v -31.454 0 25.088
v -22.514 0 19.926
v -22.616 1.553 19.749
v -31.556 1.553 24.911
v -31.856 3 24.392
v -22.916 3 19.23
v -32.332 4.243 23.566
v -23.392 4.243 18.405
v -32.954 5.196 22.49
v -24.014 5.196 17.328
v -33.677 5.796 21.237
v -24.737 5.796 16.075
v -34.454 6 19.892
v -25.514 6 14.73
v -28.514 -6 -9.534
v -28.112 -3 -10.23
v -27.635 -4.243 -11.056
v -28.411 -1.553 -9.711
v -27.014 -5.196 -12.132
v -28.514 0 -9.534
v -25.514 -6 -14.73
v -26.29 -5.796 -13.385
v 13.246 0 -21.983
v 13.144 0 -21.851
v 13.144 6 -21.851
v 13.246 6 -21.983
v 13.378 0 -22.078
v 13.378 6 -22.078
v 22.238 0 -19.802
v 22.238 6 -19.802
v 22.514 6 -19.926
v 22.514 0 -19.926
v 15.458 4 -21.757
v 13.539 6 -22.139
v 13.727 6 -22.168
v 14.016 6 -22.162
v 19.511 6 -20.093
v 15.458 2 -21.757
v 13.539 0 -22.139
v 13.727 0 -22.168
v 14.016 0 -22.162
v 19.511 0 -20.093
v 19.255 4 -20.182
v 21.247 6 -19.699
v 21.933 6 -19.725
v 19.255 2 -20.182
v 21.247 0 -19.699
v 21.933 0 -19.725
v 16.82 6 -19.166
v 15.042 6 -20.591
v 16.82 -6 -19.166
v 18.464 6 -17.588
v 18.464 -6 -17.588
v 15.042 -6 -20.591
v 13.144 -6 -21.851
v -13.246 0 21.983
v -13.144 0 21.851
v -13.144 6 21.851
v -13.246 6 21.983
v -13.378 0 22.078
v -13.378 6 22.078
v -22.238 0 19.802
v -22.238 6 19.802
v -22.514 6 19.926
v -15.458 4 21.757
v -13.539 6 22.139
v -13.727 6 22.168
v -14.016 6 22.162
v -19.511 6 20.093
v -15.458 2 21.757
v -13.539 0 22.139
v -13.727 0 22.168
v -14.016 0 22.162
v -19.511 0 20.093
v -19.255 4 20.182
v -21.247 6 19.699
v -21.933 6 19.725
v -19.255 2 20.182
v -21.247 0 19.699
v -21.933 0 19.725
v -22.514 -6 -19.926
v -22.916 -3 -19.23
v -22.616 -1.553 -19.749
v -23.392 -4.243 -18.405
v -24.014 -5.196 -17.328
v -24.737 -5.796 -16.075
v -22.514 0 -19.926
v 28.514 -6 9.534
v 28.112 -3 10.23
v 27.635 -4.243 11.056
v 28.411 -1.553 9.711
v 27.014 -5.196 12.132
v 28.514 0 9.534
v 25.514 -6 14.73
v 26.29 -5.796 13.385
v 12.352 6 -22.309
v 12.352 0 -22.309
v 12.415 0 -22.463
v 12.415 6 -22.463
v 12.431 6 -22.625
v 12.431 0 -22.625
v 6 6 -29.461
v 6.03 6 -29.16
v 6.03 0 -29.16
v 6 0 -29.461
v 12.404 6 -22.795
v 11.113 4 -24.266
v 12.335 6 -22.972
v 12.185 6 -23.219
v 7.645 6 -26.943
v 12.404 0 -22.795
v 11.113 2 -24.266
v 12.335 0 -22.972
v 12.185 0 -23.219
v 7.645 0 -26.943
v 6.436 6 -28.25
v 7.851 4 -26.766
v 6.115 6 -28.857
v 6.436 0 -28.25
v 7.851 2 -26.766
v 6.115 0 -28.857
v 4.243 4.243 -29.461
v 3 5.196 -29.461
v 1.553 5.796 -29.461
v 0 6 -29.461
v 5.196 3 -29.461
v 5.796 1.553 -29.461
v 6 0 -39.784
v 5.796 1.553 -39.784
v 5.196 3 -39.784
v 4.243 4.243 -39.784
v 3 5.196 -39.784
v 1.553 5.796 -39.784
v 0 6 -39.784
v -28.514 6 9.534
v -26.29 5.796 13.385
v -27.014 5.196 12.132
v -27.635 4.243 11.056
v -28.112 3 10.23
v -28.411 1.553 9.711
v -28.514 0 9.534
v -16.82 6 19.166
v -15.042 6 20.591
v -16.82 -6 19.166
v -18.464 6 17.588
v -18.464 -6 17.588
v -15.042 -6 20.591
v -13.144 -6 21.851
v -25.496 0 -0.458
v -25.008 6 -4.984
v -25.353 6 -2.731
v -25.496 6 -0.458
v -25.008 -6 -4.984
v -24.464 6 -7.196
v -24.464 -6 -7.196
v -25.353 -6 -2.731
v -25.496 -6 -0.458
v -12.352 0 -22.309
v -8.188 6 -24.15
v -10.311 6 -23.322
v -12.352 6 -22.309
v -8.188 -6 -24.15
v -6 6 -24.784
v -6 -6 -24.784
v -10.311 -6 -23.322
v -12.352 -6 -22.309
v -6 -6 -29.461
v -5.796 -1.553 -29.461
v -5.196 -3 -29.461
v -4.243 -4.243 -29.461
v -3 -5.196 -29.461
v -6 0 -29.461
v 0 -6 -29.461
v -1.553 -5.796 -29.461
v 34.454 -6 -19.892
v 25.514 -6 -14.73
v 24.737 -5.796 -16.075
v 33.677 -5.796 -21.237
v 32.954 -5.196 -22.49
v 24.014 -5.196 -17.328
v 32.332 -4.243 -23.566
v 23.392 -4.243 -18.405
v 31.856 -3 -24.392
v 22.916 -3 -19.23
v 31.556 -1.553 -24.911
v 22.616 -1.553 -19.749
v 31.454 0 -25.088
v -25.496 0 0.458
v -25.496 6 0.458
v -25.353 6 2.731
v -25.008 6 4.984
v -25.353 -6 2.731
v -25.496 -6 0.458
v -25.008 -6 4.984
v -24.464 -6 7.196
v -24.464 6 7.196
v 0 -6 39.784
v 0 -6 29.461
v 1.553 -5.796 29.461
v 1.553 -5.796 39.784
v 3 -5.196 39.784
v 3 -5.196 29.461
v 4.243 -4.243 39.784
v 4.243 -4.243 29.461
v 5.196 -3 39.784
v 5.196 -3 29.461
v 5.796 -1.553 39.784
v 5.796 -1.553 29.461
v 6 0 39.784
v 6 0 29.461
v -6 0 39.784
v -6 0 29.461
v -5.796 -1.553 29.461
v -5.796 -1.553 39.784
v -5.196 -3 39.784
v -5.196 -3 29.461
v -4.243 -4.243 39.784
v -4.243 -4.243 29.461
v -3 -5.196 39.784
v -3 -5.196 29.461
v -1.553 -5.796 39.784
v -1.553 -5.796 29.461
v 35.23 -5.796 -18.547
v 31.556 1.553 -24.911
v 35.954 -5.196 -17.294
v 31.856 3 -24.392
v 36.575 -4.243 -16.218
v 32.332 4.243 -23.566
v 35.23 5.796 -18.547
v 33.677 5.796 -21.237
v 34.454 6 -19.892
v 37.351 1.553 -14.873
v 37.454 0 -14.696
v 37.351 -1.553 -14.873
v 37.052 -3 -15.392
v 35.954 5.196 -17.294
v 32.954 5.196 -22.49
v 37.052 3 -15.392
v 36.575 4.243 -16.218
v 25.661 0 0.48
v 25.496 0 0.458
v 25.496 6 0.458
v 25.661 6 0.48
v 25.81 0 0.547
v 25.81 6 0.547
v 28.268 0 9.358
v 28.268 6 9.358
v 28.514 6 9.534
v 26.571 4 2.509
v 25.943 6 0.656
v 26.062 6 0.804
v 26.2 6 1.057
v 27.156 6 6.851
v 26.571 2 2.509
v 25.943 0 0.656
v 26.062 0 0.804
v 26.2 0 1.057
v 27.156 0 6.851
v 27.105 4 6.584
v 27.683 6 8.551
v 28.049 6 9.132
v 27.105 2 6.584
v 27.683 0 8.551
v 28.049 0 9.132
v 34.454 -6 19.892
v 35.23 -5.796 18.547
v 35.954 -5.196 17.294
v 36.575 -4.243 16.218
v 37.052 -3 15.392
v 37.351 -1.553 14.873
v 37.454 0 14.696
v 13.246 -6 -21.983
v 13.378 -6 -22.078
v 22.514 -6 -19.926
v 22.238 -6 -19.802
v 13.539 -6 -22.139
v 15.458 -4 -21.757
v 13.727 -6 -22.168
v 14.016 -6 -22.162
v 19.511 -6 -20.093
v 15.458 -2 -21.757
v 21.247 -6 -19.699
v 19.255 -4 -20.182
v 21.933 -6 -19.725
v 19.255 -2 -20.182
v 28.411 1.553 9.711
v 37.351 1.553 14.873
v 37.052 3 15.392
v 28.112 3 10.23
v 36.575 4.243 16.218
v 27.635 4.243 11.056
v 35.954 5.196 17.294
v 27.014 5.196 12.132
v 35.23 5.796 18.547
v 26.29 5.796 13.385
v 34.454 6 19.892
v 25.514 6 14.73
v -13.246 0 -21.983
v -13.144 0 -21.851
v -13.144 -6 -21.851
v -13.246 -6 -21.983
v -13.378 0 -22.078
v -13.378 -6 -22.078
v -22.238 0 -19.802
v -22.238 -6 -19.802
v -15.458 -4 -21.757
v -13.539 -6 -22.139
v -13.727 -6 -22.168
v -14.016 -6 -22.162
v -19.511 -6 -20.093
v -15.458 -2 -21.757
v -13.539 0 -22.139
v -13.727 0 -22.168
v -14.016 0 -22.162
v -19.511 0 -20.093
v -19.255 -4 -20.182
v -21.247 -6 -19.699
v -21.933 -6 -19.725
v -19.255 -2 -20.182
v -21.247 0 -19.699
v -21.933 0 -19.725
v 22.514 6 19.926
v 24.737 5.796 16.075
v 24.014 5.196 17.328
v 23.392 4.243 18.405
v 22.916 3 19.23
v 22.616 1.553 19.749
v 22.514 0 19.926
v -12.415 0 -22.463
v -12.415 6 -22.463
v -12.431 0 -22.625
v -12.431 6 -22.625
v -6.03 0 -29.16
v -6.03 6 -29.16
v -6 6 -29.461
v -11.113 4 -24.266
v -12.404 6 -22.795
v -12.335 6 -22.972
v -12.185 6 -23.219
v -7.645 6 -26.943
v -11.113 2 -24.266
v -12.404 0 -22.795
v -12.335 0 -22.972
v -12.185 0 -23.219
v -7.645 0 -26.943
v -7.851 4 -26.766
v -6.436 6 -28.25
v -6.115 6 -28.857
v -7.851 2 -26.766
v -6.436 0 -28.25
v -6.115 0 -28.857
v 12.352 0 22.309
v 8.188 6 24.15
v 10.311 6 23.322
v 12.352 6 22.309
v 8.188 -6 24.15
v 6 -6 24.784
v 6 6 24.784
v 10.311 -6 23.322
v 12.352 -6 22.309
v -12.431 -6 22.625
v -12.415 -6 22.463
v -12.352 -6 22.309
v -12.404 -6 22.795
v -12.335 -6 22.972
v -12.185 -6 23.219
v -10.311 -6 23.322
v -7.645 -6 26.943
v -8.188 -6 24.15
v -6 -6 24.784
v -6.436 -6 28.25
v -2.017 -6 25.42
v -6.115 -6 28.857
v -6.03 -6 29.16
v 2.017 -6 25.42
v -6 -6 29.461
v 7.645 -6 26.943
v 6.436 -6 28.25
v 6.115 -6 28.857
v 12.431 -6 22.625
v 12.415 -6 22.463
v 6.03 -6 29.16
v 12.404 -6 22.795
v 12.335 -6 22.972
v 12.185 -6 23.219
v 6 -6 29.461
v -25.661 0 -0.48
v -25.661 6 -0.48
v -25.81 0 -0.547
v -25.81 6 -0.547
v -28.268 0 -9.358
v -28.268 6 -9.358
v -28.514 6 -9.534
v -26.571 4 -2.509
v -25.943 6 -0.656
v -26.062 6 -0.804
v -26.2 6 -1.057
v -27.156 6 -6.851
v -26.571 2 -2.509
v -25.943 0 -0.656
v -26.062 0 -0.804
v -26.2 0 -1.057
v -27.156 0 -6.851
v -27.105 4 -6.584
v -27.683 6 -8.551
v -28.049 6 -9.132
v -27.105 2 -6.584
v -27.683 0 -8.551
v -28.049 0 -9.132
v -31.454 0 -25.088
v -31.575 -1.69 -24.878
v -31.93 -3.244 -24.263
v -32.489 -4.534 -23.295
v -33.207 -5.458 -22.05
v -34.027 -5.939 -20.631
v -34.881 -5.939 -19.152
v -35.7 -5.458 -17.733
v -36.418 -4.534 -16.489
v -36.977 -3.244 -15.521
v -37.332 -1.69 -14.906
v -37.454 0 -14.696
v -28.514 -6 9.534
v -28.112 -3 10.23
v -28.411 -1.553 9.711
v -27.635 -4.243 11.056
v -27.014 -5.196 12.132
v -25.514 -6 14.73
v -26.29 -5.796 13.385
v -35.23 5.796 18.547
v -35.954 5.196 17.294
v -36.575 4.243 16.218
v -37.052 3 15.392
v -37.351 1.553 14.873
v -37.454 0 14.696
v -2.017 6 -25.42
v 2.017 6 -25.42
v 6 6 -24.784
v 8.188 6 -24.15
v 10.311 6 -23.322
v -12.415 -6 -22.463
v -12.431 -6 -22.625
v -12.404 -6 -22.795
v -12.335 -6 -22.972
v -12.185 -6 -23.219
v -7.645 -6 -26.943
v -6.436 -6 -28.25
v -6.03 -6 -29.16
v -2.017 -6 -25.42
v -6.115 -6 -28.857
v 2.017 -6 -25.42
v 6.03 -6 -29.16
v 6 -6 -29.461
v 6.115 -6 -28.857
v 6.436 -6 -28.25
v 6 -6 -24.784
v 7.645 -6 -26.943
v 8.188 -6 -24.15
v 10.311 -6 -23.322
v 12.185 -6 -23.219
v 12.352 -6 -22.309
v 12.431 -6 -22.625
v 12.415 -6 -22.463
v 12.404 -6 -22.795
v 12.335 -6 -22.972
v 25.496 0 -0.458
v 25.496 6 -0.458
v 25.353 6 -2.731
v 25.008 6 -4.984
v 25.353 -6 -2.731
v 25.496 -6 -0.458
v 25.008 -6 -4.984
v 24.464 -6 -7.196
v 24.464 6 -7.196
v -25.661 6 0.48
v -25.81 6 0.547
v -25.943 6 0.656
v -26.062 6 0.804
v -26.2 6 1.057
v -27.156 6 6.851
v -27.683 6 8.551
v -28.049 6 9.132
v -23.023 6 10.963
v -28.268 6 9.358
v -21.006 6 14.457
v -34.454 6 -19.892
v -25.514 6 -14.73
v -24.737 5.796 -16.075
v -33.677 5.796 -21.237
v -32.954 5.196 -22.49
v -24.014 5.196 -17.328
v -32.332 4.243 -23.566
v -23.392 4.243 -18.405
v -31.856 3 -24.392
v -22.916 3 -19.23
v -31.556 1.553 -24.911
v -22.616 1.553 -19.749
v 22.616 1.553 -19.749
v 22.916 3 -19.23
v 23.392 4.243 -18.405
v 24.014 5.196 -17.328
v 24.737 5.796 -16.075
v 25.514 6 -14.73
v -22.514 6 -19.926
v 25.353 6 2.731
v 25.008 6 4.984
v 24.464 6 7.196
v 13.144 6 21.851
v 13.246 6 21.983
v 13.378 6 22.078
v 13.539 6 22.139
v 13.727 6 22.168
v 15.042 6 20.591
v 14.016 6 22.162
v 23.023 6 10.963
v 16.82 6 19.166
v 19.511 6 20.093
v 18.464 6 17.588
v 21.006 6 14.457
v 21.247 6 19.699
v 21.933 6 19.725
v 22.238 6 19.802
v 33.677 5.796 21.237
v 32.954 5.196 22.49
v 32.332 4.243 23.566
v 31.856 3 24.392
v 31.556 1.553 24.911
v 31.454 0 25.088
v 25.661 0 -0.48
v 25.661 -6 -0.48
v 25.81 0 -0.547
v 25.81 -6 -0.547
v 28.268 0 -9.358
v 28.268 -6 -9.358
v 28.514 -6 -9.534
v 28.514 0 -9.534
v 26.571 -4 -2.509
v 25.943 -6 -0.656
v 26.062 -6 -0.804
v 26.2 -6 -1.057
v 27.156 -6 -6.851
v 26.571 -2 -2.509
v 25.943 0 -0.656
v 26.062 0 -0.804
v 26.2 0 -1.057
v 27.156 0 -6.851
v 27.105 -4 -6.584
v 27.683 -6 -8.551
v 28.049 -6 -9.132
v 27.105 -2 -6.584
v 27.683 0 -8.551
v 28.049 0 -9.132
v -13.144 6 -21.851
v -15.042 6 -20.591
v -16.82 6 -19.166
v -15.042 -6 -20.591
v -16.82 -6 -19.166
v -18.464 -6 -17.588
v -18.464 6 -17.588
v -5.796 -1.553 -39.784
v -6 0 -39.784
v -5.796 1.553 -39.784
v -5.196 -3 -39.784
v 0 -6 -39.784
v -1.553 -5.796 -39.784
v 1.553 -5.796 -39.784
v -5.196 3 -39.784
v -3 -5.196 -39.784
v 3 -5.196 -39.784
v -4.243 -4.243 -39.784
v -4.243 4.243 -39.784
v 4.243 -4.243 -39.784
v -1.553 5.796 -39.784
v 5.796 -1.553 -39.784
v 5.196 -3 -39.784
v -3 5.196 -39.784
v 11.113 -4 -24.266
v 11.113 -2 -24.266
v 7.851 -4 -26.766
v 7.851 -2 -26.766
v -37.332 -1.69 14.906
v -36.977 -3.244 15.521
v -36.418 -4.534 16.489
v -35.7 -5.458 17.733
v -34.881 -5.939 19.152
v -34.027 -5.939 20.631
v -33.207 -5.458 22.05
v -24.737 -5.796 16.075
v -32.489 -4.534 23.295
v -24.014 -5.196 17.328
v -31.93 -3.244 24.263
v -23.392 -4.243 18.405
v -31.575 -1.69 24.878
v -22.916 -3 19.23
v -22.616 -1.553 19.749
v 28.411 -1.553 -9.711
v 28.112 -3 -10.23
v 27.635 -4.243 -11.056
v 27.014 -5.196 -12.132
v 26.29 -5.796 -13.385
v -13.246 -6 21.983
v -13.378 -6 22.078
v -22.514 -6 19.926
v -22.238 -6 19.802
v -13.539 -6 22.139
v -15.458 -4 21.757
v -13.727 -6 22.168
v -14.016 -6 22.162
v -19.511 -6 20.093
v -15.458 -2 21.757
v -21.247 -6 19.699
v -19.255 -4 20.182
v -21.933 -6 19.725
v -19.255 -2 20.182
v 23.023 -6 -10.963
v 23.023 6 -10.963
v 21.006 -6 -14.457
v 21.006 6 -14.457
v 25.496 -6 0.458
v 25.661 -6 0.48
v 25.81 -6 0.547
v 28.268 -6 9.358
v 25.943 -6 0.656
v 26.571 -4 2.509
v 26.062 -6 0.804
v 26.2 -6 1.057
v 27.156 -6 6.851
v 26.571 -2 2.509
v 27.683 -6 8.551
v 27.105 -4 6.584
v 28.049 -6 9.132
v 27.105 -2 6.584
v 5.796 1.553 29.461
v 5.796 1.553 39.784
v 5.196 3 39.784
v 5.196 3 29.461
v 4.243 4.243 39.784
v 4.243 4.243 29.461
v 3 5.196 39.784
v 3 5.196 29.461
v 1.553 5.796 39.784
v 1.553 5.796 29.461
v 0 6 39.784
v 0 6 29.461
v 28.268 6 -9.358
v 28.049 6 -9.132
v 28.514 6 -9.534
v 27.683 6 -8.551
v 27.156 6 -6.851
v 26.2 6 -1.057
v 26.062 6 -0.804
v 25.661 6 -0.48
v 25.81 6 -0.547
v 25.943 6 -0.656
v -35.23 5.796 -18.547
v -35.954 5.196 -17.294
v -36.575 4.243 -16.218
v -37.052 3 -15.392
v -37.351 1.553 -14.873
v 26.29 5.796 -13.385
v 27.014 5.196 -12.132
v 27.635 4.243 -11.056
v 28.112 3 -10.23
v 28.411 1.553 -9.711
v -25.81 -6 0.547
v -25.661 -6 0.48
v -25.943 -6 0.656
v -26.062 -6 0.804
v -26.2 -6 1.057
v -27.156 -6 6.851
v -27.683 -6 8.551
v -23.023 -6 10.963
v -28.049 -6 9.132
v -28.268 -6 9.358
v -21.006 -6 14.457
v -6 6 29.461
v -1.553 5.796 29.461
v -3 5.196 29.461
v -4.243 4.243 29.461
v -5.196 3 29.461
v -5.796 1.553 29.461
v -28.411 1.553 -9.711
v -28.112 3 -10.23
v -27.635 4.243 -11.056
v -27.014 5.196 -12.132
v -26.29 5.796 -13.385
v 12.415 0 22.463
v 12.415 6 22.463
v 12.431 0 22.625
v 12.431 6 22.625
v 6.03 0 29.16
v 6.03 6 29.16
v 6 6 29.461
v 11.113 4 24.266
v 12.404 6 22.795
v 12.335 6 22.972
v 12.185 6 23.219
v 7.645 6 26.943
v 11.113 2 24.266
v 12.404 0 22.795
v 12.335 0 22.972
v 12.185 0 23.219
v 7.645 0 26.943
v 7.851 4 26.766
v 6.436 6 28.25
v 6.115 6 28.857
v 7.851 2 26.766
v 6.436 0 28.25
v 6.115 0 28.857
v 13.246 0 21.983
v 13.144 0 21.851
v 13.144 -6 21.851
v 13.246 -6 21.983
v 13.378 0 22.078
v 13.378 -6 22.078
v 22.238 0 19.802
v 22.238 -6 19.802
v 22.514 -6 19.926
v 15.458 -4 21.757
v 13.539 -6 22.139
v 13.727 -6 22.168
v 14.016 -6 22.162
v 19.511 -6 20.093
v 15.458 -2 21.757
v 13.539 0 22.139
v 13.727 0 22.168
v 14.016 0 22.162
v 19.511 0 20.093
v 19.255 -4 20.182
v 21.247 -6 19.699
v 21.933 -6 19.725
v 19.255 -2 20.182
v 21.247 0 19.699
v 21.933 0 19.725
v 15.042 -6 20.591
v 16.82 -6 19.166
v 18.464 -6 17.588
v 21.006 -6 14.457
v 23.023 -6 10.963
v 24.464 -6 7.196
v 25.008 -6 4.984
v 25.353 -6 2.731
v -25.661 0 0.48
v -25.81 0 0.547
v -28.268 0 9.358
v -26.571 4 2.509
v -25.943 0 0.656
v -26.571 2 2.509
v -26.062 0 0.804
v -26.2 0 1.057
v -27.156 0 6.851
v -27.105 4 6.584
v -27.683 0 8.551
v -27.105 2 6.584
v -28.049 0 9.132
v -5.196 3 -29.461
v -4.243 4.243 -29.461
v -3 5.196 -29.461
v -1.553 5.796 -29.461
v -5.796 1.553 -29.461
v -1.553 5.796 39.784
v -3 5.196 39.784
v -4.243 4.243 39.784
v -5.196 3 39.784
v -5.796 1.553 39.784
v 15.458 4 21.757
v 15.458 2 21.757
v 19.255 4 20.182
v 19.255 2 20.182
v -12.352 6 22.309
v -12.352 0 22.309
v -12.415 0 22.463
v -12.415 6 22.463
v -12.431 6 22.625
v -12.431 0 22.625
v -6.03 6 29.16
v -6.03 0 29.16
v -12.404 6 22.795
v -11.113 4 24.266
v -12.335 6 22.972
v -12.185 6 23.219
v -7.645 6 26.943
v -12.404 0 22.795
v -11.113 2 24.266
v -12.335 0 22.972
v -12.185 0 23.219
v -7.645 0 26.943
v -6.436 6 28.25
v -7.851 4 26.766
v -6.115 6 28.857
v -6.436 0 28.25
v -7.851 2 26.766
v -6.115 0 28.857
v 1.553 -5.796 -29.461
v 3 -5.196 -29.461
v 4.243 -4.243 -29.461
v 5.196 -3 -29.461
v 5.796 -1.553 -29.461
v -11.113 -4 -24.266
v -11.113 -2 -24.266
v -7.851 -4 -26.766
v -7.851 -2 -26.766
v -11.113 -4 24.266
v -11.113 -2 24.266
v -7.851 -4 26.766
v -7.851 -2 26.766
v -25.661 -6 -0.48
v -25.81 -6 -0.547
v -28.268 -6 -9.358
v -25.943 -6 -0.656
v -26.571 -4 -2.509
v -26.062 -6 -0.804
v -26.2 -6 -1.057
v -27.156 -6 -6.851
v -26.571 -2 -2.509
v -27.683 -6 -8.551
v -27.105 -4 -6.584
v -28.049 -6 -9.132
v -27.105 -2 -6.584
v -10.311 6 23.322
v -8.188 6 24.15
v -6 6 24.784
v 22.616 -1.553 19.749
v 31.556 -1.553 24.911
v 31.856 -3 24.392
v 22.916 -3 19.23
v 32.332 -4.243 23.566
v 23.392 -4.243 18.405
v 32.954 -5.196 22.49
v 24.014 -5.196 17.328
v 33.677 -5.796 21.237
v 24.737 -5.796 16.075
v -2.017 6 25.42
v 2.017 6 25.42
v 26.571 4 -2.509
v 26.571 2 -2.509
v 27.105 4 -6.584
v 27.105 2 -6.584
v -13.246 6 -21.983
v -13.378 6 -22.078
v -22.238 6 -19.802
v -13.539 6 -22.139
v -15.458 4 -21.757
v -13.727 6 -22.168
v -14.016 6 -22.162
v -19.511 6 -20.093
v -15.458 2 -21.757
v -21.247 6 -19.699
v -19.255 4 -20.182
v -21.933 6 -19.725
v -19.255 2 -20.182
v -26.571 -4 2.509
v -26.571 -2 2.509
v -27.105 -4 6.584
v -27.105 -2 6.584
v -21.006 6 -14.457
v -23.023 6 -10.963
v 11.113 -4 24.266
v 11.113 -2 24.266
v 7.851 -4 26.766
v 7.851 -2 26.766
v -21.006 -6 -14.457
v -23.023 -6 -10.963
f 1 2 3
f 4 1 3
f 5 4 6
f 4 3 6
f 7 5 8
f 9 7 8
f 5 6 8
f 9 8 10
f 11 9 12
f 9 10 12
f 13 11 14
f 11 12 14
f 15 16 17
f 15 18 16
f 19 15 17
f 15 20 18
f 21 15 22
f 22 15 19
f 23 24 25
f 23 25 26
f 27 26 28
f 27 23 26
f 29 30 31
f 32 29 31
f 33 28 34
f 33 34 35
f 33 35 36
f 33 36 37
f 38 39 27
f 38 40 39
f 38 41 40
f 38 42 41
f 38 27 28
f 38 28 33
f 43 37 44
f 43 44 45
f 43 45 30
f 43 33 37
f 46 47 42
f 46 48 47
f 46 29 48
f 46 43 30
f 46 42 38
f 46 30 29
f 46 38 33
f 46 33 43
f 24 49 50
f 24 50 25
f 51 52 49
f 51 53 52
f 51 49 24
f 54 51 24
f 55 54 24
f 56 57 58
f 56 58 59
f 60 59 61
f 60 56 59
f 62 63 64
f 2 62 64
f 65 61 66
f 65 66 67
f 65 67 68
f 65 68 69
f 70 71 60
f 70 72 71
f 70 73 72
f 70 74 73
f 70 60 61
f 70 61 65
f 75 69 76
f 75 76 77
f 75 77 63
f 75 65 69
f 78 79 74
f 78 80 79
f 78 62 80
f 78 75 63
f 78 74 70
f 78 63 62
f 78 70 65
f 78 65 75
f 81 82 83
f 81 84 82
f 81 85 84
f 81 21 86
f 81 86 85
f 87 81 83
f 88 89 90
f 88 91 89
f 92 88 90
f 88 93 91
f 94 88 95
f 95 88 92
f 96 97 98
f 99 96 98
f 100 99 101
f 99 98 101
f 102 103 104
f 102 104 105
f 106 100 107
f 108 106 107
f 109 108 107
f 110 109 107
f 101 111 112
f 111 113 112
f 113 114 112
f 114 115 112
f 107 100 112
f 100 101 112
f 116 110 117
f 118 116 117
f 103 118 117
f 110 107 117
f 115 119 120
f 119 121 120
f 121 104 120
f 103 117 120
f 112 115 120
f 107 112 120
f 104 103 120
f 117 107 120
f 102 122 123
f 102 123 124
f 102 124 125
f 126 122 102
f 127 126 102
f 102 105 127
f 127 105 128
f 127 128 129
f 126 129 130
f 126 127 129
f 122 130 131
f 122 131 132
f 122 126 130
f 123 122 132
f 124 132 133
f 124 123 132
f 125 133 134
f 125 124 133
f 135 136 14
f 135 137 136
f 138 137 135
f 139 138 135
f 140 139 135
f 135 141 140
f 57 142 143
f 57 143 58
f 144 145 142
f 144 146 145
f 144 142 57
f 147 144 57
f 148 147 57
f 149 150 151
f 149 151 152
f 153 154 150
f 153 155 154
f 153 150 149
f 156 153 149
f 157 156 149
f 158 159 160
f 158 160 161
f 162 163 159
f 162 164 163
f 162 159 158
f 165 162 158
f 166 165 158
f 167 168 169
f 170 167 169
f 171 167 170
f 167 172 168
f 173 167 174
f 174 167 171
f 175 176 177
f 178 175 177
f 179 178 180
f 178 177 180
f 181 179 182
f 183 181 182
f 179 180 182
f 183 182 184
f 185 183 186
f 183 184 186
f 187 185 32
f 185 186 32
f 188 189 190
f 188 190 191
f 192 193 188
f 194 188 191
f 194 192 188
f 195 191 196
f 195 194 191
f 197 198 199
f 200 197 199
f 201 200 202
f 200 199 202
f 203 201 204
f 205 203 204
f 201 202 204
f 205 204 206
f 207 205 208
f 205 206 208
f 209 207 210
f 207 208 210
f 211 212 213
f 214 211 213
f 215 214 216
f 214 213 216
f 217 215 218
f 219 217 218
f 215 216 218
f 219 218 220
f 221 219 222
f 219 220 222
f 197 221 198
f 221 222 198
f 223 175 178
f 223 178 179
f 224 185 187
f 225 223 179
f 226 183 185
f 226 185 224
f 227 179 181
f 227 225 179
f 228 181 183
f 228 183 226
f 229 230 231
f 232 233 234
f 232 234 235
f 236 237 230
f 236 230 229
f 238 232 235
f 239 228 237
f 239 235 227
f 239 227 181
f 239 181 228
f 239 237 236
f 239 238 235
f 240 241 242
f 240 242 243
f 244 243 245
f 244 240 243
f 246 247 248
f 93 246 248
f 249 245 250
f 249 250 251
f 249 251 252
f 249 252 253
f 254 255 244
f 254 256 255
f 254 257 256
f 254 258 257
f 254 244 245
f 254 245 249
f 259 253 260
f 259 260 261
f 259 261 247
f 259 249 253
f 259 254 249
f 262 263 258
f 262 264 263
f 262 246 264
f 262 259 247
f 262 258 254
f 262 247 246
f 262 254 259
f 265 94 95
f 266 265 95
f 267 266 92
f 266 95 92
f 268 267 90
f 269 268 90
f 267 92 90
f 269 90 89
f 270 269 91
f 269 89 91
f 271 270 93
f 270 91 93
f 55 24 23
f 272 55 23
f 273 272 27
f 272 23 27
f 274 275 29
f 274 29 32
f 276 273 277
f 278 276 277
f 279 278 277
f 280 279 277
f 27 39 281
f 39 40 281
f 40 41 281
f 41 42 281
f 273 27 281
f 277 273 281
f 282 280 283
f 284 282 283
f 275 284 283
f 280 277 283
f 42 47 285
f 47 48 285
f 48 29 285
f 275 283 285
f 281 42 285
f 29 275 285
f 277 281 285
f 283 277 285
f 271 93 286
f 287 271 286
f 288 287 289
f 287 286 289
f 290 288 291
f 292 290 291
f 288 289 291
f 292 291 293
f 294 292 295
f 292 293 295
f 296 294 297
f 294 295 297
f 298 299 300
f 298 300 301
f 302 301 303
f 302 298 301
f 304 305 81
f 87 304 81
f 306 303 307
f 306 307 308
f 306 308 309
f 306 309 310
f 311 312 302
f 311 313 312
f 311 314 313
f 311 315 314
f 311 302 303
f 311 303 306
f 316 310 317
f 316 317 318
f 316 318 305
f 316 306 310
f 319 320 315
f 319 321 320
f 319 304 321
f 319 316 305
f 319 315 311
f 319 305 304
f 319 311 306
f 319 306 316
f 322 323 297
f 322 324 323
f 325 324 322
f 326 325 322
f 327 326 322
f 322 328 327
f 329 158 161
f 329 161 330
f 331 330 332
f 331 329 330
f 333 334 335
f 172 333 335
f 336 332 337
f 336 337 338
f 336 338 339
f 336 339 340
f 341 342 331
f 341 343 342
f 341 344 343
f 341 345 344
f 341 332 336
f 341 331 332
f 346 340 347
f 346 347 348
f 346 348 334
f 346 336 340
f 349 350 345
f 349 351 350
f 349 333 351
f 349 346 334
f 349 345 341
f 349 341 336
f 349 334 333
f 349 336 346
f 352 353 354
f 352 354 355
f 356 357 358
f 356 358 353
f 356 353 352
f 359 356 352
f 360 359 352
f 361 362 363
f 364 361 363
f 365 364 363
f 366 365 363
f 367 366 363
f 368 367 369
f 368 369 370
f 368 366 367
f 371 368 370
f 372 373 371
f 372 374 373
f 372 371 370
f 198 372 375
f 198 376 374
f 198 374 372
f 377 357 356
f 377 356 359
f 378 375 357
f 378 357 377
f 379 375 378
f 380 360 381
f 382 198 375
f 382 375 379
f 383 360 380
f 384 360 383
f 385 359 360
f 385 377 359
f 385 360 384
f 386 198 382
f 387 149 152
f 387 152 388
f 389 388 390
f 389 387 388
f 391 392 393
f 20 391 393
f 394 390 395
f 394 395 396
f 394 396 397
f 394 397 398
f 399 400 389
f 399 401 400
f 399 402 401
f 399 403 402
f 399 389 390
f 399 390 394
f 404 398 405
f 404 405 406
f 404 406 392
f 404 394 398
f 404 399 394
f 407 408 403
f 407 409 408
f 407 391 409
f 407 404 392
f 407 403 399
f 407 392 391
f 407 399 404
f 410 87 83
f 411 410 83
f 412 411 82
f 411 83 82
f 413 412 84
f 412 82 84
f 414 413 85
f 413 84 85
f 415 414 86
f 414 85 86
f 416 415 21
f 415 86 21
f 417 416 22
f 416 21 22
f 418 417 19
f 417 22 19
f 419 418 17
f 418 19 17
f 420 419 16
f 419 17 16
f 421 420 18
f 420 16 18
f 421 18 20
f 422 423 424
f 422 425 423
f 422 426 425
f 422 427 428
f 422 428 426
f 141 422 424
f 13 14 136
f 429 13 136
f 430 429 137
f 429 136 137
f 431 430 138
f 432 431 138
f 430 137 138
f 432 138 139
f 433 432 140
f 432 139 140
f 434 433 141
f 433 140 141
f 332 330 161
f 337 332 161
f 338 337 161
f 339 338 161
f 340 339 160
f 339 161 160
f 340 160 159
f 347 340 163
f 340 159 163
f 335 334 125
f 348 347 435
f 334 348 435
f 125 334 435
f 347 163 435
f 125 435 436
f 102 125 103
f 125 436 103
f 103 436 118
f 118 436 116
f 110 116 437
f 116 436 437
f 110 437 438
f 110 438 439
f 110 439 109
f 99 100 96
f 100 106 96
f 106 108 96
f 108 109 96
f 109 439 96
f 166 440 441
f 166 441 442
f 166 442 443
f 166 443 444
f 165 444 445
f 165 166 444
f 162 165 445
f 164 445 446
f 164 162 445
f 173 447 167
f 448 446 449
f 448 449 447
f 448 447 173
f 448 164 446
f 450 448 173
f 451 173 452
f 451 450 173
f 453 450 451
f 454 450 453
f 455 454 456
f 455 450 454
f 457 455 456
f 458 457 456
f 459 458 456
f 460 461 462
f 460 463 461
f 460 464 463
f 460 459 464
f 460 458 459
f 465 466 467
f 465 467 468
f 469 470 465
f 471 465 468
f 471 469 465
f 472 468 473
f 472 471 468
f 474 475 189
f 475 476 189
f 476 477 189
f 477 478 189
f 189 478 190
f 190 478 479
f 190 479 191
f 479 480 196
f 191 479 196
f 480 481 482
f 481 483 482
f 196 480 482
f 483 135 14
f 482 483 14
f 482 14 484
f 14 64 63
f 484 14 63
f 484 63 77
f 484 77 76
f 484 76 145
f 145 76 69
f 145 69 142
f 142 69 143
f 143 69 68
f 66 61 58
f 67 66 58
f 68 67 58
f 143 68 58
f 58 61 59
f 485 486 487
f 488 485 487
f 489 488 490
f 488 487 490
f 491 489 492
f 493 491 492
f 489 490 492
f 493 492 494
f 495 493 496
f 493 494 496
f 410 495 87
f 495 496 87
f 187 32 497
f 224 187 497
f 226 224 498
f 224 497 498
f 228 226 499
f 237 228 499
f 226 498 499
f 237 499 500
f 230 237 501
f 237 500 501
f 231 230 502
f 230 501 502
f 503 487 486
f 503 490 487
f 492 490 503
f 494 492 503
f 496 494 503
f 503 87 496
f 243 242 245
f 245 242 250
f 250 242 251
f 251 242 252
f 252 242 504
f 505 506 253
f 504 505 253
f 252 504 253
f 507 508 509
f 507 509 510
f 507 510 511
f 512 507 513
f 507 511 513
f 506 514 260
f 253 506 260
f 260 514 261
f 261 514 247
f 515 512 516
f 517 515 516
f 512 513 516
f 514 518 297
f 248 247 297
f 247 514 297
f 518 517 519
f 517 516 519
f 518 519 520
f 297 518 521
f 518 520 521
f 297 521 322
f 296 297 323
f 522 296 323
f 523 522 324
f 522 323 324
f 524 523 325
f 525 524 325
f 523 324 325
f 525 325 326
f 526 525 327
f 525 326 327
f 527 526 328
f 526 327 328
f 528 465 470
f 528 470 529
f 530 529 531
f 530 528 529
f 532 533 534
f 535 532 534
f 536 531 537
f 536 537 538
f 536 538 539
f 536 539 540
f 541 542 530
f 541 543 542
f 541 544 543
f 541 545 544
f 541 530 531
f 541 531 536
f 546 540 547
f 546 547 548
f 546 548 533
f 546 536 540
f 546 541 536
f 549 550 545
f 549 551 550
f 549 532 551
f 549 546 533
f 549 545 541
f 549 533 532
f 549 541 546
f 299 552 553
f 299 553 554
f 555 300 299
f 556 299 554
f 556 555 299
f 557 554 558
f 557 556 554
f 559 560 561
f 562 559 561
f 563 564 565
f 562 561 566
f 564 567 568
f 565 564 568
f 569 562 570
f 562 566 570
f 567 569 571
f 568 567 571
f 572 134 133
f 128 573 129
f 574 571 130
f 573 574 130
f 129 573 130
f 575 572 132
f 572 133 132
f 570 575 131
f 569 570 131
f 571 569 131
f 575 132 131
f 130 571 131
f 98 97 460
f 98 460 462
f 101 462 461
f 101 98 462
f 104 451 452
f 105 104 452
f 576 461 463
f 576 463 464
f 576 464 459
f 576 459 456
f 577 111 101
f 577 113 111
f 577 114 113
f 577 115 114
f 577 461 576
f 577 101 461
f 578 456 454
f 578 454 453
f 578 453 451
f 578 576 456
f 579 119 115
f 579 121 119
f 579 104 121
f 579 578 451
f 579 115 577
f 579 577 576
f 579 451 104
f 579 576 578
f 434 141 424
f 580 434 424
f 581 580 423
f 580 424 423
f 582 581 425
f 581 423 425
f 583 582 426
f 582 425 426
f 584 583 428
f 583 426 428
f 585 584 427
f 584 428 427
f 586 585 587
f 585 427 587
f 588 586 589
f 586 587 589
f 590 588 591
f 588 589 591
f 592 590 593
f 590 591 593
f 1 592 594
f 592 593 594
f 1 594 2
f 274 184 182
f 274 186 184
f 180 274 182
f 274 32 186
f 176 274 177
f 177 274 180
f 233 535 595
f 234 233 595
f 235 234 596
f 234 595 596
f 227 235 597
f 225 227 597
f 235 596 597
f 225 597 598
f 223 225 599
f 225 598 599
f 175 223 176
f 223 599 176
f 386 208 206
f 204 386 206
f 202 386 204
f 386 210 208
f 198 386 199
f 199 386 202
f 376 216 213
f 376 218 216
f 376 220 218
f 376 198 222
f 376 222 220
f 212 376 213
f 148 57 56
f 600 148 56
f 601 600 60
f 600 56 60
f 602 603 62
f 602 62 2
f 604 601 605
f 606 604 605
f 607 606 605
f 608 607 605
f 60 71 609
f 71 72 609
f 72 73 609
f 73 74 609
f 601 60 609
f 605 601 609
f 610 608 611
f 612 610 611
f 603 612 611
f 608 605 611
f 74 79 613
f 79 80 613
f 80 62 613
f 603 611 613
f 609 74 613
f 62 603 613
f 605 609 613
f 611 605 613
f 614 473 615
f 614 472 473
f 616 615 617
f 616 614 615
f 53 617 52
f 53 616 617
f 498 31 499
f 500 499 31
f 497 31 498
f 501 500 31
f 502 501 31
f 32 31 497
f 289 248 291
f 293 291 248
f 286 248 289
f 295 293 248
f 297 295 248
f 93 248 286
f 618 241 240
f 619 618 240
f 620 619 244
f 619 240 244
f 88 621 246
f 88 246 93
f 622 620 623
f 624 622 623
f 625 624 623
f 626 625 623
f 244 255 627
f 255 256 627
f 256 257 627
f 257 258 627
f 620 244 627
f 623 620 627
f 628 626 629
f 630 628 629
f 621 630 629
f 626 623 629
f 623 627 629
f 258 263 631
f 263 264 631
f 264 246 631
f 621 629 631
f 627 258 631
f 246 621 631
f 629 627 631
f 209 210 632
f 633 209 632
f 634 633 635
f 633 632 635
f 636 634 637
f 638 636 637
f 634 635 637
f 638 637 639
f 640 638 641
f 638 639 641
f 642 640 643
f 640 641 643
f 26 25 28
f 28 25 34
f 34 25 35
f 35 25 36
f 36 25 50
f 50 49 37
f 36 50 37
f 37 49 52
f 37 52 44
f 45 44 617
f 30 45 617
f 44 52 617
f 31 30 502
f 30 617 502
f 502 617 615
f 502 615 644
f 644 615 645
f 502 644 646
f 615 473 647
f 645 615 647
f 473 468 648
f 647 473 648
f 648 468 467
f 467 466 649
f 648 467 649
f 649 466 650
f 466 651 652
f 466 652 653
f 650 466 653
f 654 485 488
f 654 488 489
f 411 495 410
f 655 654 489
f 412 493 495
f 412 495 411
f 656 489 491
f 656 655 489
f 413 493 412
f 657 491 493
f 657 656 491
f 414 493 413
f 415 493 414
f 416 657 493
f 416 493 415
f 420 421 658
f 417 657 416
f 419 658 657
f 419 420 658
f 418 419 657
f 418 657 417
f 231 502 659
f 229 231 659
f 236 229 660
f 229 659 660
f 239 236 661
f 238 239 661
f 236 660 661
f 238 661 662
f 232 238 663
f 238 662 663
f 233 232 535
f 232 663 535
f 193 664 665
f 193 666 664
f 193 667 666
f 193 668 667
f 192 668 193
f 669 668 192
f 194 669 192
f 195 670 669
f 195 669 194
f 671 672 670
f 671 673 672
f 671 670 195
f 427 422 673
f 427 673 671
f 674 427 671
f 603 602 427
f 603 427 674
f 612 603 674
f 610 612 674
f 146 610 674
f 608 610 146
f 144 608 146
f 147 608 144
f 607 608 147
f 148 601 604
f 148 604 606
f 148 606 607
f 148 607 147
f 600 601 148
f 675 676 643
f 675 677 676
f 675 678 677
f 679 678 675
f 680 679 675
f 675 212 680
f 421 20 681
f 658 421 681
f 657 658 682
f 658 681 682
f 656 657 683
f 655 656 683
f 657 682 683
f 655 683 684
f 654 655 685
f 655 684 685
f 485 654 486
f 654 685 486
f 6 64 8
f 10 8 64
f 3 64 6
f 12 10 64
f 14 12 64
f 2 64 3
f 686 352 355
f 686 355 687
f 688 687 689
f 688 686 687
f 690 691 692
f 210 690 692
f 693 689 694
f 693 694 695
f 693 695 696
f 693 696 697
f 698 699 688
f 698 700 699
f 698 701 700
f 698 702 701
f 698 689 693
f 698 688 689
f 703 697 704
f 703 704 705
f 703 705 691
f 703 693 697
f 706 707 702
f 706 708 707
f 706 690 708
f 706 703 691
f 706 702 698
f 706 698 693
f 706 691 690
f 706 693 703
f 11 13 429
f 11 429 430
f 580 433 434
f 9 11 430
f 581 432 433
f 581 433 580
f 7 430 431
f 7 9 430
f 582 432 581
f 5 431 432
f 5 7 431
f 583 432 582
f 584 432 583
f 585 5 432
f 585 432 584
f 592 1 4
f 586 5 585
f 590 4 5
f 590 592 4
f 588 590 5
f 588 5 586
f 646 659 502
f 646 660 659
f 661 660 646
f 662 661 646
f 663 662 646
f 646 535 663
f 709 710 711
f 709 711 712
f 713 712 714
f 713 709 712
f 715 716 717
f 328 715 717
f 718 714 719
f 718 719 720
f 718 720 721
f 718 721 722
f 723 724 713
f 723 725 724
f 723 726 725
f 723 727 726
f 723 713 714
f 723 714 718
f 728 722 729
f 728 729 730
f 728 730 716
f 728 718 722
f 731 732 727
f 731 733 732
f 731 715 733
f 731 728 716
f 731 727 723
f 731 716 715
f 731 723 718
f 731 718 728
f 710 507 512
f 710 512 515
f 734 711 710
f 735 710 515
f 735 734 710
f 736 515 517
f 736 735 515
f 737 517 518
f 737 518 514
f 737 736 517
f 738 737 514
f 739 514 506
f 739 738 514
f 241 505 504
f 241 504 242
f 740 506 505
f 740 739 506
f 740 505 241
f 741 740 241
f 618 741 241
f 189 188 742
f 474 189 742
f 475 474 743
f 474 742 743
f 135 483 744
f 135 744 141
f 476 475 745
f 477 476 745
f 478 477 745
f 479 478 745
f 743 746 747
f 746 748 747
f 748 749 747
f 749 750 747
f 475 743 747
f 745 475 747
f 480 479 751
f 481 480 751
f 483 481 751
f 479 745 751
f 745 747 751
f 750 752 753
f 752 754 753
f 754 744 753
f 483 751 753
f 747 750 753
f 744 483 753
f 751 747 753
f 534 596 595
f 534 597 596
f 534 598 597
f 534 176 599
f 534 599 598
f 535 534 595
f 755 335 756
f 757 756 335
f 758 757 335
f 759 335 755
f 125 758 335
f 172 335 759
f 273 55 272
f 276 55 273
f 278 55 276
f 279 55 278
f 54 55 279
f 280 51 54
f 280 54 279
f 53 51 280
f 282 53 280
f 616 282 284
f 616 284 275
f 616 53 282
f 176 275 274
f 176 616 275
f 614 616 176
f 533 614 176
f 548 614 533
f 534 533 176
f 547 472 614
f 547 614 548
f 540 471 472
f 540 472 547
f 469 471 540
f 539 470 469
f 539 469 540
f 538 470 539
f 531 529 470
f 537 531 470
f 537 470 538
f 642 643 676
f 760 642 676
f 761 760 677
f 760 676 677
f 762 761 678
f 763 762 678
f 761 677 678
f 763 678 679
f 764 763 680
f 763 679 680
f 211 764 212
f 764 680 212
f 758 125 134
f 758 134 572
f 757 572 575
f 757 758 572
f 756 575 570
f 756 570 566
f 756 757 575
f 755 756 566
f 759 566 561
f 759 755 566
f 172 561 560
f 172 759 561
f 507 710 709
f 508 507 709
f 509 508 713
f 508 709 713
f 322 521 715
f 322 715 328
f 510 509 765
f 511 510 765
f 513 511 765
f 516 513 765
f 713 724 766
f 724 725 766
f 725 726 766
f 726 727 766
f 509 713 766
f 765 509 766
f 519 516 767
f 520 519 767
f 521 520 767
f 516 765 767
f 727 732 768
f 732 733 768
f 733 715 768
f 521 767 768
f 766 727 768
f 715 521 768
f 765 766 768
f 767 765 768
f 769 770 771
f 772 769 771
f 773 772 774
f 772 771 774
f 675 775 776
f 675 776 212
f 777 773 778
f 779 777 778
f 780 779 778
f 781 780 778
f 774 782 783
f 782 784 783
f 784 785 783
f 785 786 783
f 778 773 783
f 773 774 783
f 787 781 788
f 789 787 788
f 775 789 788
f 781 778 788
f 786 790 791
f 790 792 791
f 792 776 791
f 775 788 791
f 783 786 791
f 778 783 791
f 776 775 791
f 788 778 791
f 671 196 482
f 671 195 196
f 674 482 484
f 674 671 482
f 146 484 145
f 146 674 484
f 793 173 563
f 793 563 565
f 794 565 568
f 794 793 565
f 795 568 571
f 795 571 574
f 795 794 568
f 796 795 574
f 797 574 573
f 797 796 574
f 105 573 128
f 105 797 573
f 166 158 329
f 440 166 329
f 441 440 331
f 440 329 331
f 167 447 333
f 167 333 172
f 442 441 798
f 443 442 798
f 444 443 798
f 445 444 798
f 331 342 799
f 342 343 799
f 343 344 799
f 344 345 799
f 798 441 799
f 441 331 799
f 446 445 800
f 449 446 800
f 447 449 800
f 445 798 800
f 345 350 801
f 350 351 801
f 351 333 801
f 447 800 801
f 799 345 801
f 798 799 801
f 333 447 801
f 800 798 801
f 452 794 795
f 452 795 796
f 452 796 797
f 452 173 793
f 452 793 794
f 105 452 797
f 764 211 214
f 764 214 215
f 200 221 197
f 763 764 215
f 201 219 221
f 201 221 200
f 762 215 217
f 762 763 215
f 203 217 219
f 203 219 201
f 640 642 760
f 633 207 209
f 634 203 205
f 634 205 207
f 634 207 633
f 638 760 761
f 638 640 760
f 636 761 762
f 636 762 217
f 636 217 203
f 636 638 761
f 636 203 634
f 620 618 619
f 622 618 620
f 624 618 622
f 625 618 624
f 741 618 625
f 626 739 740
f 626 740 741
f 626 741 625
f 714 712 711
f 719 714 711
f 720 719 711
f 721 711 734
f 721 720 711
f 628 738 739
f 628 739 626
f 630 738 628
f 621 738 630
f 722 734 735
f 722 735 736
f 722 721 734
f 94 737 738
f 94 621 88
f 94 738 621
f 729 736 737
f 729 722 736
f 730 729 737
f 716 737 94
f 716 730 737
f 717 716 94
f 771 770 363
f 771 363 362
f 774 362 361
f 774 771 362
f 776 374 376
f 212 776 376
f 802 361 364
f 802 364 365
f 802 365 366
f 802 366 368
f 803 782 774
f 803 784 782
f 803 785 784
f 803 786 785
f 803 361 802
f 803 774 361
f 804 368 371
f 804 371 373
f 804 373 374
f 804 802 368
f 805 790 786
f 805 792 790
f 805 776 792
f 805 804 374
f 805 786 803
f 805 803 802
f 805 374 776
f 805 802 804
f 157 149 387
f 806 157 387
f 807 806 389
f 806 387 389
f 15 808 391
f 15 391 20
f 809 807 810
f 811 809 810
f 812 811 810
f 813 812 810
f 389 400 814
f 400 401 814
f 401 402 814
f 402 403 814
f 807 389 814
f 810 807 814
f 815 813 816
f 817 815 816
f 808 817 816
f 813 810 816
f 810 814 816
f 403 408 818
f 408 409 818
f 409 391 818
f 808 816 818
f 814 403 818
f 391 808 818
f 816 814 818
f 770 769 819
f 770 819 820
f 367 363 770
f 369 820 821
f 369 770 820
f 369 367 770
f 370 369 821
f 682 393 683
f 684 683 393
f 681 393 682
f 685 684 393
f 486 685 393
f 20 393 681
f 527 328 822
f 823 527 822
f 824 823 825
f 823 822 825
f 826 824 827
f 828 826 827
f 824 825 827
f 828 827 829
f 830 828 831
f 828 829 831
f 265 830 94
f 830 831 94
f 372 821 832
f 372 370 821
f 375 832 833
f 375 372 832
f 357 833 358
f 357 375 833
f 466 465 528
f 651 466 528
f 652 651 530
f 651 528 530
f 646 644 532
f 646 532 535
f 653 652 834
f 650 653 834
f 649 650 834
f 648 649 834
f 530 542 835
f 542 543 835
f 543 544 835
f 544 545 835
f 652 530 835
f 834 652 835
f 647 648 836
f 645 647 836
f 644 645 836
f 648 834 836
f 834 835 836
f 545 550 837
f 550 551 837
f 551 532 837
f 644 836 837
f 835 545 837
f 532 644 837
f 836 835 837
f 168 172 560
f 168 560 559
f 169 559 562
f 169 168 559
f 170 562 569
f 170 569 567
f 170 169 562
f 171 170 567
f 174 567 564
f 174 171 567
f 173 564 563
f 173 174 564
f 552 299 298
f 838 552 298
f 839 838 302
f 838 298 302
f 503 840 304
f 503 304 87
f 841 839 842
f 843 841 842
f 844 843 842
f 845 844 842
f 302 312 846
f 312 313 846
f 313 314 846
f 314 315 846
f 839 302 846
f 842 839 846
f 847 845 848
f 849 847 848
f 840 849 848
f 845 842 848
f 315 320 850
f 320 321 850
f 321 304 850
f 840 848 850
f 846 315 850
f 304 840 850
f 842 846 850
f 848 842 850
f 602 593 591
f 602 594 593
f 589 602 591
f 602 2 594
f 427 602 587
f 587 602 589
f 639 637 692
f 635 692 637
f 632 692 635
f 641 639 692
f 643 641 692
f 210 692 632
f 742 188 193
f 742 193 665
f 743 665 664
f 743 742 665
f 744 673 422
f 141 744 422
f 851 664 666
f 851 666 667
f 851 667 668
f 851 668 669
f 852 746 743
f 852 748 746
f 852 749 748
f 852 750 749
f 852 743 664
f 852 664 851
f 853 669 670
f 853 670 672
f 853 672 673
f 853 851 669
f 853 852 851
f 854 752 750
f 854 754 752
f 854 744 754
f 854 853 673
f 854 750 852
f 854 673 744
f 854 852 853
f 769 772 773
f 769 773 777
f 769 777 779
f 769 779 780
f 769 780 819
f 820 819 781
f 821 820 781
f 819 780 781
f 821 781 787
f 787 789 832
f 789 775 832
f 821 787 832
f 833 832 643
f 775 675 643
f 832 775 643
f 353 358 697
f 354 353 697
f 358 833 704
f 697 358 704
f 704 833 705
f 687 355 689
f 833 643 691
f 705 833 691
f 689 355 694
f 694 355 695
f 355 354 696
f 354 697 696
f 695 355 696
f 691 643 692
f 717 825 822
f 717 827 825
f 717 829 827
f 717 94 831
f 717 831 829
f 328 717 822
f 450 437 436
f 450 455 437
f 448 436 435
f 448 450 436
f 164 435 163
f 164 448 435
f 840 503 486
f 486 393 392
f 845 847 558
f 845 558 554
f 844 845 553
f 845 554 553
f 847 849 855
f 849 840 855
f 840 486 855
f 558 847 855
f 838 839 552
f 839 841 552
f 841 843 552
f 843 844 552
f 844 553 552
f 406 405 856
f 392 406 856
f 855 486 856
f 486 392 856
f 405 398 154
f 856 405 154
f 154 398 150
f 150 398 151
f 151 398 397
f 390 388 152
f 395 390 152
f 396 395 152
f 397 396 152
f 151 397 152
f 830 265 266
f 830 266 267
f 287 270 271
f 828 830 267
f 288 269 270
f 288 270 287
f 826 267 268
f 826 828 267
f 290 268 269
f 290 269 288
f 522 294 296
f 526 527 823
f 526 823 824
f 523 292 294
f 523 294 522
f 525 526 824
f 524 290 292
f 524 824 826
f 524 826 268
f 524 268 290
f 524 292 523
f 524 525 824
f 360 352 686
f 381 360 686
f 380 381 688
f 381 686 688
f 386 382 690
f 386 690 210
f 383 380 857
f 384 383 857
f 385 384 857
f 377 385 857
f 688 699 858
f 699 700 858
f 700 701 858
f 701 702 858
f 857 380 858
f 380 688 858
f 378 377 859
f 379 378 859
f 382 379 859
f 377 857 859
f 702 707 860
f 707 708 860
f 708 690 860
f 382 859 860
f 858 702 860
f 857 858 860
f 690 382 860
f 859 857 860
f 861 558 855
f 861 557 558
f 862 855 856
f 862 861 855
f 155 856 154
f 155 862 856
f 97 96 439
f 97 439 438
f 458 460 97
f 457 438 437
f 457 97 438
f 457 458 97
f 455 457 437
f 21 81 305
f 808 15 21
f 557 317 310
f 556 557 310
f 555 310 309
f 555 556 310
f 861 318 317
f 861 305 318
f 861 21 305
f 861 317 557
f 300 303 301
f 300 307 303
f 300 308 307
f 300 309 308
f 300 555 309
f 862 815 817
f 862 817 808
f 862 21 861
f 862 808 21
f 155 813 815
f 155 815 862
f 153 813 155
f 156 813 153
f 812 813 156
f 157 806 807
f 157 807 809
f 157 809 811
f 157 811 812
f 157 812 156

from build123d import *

# Parameters (mm, degrees)
F1_DEPTH  = 6
F3_DEPTH  = 10.323
F6_DEPTH  = 10.323
F8_DEPTH  = 10.323
F9_R      = 6
F10_DEPTH = 10.323
F11_R     = 6
F12_DEPTH = 10.323


with BuildPart() as f1:
    # F0 (on Front) → F1 (new body, symmetric)
    with BuildSketch(Plane.XZ):
        with BuildLine():
            ThreePointArc((-6, 24.7840674628), (0, 25.5), (6, 24.7840674628))
            Line((6, 24.7840674628), (6, 29.4606685638))
            Line((6, 29.4606685638), (-6, 29.4606685638))
            Line((-6, 29.4606685638), (-6, 24.7840674628))
        make_face()
        with BuildLine():
            ThreePointArc((6, 24.7840674628), (9.2589564923, 23.7596659209), (12.3517402257, 22.3088438382))
            add(Edge.make_bspline(
                [(12.3517402257, 22.3088438382), (13.2689820603, 23.877967149), (6, 26.7843715847), (6, 29.4606685638)],
                knots=[0, 0, 0, 0, 9.5652078285, 9.5652078285, 9.5652078285, 9.5652078285], degree=3))
            Line((6, 29.4606685638), (6, 24.7840674628))
        make_face()
        with BuildLine():
            ThreePointArc((-12.3517402257, 22.3088438382), (-9.2589564923, 23.7596659209), (-6, 24.7840674628))
            Line((-6, 24.7840674628), (-6, 29.4606685638))
            add(Edge.make_bspline(
                [(-12.3517402257, 22.3088438382), (-13.2689820603, 23.877967149), (-6, 26.7843715847), (-6, 29.4606685638)],
                knots=[0, 0, 0, 0, 9.5652078285, 9.5652078285, 9.5652078285, 9.5652078285], degree=3))
        make_face()
    extrude(amount=F1_DEPTH, both=True)

    # F2 (on face) → F3 (join)
    with BuildSketch(Plane.XY.offset(29.4606685638)):
        with BuildLine():
            ThreePointArc((0, -6), (4.2426406871, -4.2426406871), (6, 0))
            ThreePointArc((6, 0), (4.2426406871, 4.2426406871), (0, 6))
            ThreePointArc((0, 6), (-4.2426406871, 4.2426406871), (-6, 0))
            ThreePointArc((-6, 0), (-4.2426406871, -4.2426406871), (0, -6))
        make_face()
    extrude(amount=F3_DEPTH)


with BuildPart() as f1b:
    # F0 (on Front) → F1, piece 2 (new body, symmetric)
    with BuildSketch(Plane.XZ):
        with BuildLine():
            add(Edge.make_bspline(
                [(-13.1441553801, 21.8513427355), (-14.0444351117, 23.430259121), (-20.1959462167, 18.588338215), (-22.5136873888, 19.9264867046)],
                knots=[0, 0, 0, 0, 9.5652078285, 9.5652078285, 9.5652078285, 9.5652078285], degree=3))
            Line((-22.5136873888, 19.9264867046), (-18.4636320319, 17.5881861541))
            ThreePointArc((-18.4636320319, 17.5881861541), (-15.9469960268, 19.8983244953), (-13.1441553801, 21.8513427355))
        make_face()
        with BuildLine():
            Line((-18.4636320319, 17.5881861541), (-22.5136873888, 19.9264867046))
            Line((-22.5136873888, 19.9264867046), (-28.5136873888, 9.5341818592))
            Line((-28.5136873888, 9.5341818592), (-24.4636320319, 7.1958813087))
            ThreePointArc((-24.4636320319, 7.1958813087), (-22.0836477965, 12.75), (-18.4636320319, 17.5881861541))
        make_face()
        with BuildLine():
            Line((-24.4636320319, 7.1958813087), (-28.5136873888, 9.5341818592))
            add(Edge.make_bspline(
                [(-25.4958956058, 0.4575011027), (-27.3134171719, 0.447708028), (-26.1959462167, 8.1960333696), (-28.5136873888, 9.5341818592)],
                knots=[0, 0, 0, 0, 9.5652078285, 9.5652078285, 9.5652078285, 9.5652078285], degree=3))
            ThreePointArc((-25.4958956058, 0.4575011027), (-25.2059525191, 3.8613414256), (-24.4636320319, 7.1958813087))
        make_face()
    extrude(amount=F1_DEPTH, both=True)

    # F9 (on face) → F10 (join)
    with BuildSketch(Plane(origin=(-25.5136873888, 0, 14.7303342819), x_dir=(0, -1, 0), z_dir=(-0.8660254038, 0, 0.5))):
        Circle(F9_R)
        with BuildLine():
            ThreePointArc((0, -6), (4.2426406871, -4.2426406871), (6, 0))
            ThreePointArc((6, 0), (4.2426406871, 4.2426406871), (0, 6))
            ThreePointArc((0, 6), (-4.2426406871, 4.2426406871), (-6, 0))
            ThreePointArc((-6, 0), (-4.2426406871, -4.2426406871), (0, -6))
        make_face()
    extrude(amount=F10_DEPTH)


with BuildPart() as f1c:
    # F0 (on Front) → F1, piece 3 (new body, symmetric)
    with BuildSketch(Plane.XZ):
        with BuildLine():
            ThreePointArc((13.1441553801, 21.8513427355), (15.9469960268, 19.8983244953), (18.4636320319, 17.5881861541))
            Line((18.4636320319, 17.5881861541), (22.5136873888, 19.9264867046))
            add(Edge.make_bspline(
                [(13.1441553801, 21.8513427355), (14.0444351117, 23.430259121), (20.1959462167, 18.588338215), (22.5136873888, 19.9264867046)],
                knots=[0, 0, 0, 0, 9.5652078285, 9.5652078285, 9.5652078285, 9.5652078285], degree=3))
        make_face()
        with BuildLine():
            ThreePointArc((18.4636320319, 17.5881861541), (22.0836477965, 12.75), (24.4636320319, 7.1958813087))
            Line((24.4636320319, 7.1958813087), (28.5136873888, 9.5341818592))
            Line((28.5136873888, 9.5341818592), (22.5136873888, 19.9264867046))
            Line((22.5136873888, 19.9264867046), (18.4636320319, 17.5881861541))
        make_face()
        with BuildLine():
            ThreePointArc((24.4636320319, 7.1958813087), (25.2059525191, 3.8613414256), (25.4958956058, 0.4575011027))
            add(Edge.make_bspline(
                [(25.4958956058, 0.4575011027), (27.3134171719, 0.447708028), (26.1959462167, 8.1960333696), (28.5136873888, 9.5341818592)],
                knots=[0, 0, 0, 0, 9.5652078285, 9.5652078285, 9.5652078285, 9.5652078285], degree=3))
            Line((28.5136873888, 9.5341818592), (24.4636320319, 7.1958813087))
        make_face()
    extrude(amount=F1_DEPTH, both=True)

    # F5 (on face) → F6 (join)
    with BuildSketch(Plane(origin=(25.5136873888, 0, 14.7303342819), x_dir=(0, 1, 0), z_dir=(0.8660254038, 0, 0.5))):
        with BuildLine():
            ThreePointArc((0, -6), (4.2426406871, -4.2426406871), (6, 0))
            ThreePointArc((6, 0), (4.2426406871, 4.2426406871), (0, 6))
            ThreePointArc((0, 6), (-4.2426406871, 4.2426406871), (-6, 0))
            ThreePointArc((-6, 0), (-4.2426406871, -4.2426406871), (0, -6))
        make_face()
    extrude(amount=F6_DEPTH)


with BuildPart() as f1d:
    # F0 (on Front) → F1, piece 4 (new body, symmetric)
    with BuildSketch(Plane.XZ):
        with BuildLine():
            add(Edge.make_bspline(
                [(-25.4958956058, -0.4575011027), (-27.3134171719, -0.447708028), (-26.1959462167, -8.1960333696), (-28.5136873888, -9.5341818592)],
                knots=[0, 0, 0, 0, 9.5652078285, 9.5652078285, 9.5652078285, 9.5652078285], degree=3))
            Line((-28.5136873888, -9.5341818592), (-24.4636320319, -7.1958813087))
            ThreePointArc((-24.4636320319, -7.1958813087), (-25.2059525191, -3.8613414256), (-25.4958956058, -0.4575011027))
        make_face()
        with BuildLine():
            Line((-28.5136873888, -9.5341818592), (-22.5136873888, -19.9264867046))
            Line((-22.5136873888, -19.9264867046), (-18.4636320319, -17.5881861541))
            ThreePointArc((-18.4636320319, -17.5881861541), (-22.0836477965, -12.75), (-24.4636320319, -7.1958813087))
            Line((-24.4636320319, -7.1958813087), (-28.5136873888, -9.5341818592))
        make_face()
        with BuildLine():
            Line((-18.4636320319, -17.5881861541), (-22.5136873888, -19.9264867046))
            add(Edge.make_bspline(
                [(-13.1441553801, -21.8513427355), (-14.0444351117, -23.430259121), (-20.1959462167, -18.588338215), (-22.5136873888, -19.9264867046)],
                knots=[0, 0, 0, 0, 9.5652078285, 9.5652078285, 9.5652078285, 9.5652078285], degree=3))
            ThreePointArc((-13.1441553801, -21.8513427355), (-15.9469960268, -19.8983244953), (-18.4636320319, -17.5881861541))
        make_face()
    extrude(amount=F1_DEPTH, both=True)

    # F11 (on face) → F12 (join)
    with BuildSketch(Plane(origin=(-25.5136873888, 0, -14.7303342819), x_dir=(0, -1, 0), z_dir=(-0.8660254038, 0, -0.5))):
        Circle(F11_R)
        with BuildLine():
            ThreePointArc((0, -6), (4.2426406871, -4.2426406871), (6, 0))
            ThreePointArc((6, 0), (4.2426406871, 4.2426406871), (0, 6))
            ThreePointArc((0, 6), (-4.2426406871, 4.2426406871), (-6, 0))
            ThreePointArc((-6, 0), (-4.2426406871, -4.2426406871), (0, -6))
        make_face()
    extrude(amount=F12_DEPTH)


with BuildPart() as f1e:
    # F0 (on Front) → F1, piece 5 (new body, symmetric)
    with BuildSketch(Plane.XZ):
        with BuildLine():
            Line((-6, -29.4606685638), (-6, -24.7840674628))
            ThreePointArc((-6, -24.7840674628), (-9.2589564923, -23.7596659209), (-12.3517402257, -22.3088438382))
            add(Edge.make_bspline(
                [(-12.3517402257, -22.3088438382), (-13.2689820603, -23.877967149), (-6, -26.7843715847), (-6, -29.4606685638)],
                knots=[0, 0, 0, 0, 9.5652078285, 9.5652078285, 9.5652078285, 9.5652078285], degree=3))
        make_face()
        with BuildLine():
            Line((6, -29.4606685638), (6, -24.7840674628))
            ThreePointArc((6, -24.7840674628), (0, -25.5), (-6, -24.7840674628))
            Line((-6, -24.7840674628), (-6, -29.4606685638))
            Line((-6, -29.4606685638), (6, -29.4606685638))
        make_face()
        with BuildLine():
            add(Edge.make_bspline(
                [(12.3517402257, -22.3088438382), (13.2689820603, -23.877967149), (6, -26.7843715847), (6, -29.4606685638)],
                knots=[0, 0, 0, 0, 9.5652078285, 9.5652078285, 9.5652078285, 9.5652078285], degree=3))
            ThreePointArc((12.3517402257, -22.3088438382), (9.2589564923, -23.7596659209), (6, -24.7840674628))
            Line((6, -24.7840674628), (6, -29.4606685638))
        make_face()
    extrude(amount=F1_DEPTH, both=True)

    # F4: F1 across plane
    add(f1.part.mirror(Plane.XY))


with BuildPart() as f1f:
    # F0 (on Front) → F1, piece 6 (new body, symmetric)
    with BuildSketch(Plane.XZ):
        with BuildLine():
            Line((22.5136873888, -19.9264867046), (18.4636320319, -17.5881861541))
            ThreePointArc((18.4636320319, -17.5881861541), (15.9469960268, -19.8983244953), (13.1441553801, -21.8513427355))
            add(Edge.make_bspline(
                [(13.1441553801, -21.8513427355), (14.0444351117, -23.430259121), (20.1959462167, -18.588338215), (22.5136873888, -19.9264867046)],
                knots=[0, 0, 0, 0, 9.5652078285, 9.5652078285, 9.5652078285, 9.5652078285], degree=3))
        make_face()
        with BuildLine():
            Line((28.5136873888, -9.5341818592), (24.4636320319, -7.1958813087))
            ThreePointArc((24.4636320319, -7.1958813087), (22.0836477965, -12.75), (18.4636320319, -17.5881861541))
            Line((18.4636320319, -17.5881861541), (22.5136873888, -19.9264867046))
            Line((22.5136873888, -19.9264867046), (28.5136873888, -9.5341818592))
        make_face()
        with BuildLine():
            add(Edge.make_bspline(
                [(25.4958956058, -0.4575011027), (27.3134171719, -0.447708028), (26.1959462167, -8.1960333696), (28.5136873888, -9.5341818592)],
                knots=[0, 0, 0, 0, 9.5652078285, 9.5652078285, 9.5652078285, 9.5652078285], degree=3))
            ThreePointArc((25.4958956058, -0.4575011027), (25.2059525191, -3.8613414256), (24.4636320319, -7.1958813087))
            Line((24.4636320319, -7.1958813087), (28.5136873888, -9.5341818592))
        make_face()
    extrude(amount=F1_DEPTH, both=True)

    # F7 (on face) → F8 (join)
    with BuildSketch(Plane(origin=(25.5136873888, 0, -14.7303342819), x_dir=(0, 1, 0), z_dir=(0.8660254038, 0, -0.5))):
        with BuildLine():
            ThreePointArc((0, -6), (4.2426406871, -4.2426406871), (6, 0))
            ThreePointArc((6, 0), (4.2426406871, 4.2426406871), (0, 6))
            ThreePointArc((0, 6), (-4.2426406871, 4.2426406871), (-6, 0))
            ThreePointArc((-6, 0), (-4.2426406871, -4.2426406871), (0, -6))
        make_face()
    extrude(amount=F8_DEPTH)


solid = Compound([f1.part, f1b.part, f1c.part, f1d.part, f1e.part, f1f.part])
